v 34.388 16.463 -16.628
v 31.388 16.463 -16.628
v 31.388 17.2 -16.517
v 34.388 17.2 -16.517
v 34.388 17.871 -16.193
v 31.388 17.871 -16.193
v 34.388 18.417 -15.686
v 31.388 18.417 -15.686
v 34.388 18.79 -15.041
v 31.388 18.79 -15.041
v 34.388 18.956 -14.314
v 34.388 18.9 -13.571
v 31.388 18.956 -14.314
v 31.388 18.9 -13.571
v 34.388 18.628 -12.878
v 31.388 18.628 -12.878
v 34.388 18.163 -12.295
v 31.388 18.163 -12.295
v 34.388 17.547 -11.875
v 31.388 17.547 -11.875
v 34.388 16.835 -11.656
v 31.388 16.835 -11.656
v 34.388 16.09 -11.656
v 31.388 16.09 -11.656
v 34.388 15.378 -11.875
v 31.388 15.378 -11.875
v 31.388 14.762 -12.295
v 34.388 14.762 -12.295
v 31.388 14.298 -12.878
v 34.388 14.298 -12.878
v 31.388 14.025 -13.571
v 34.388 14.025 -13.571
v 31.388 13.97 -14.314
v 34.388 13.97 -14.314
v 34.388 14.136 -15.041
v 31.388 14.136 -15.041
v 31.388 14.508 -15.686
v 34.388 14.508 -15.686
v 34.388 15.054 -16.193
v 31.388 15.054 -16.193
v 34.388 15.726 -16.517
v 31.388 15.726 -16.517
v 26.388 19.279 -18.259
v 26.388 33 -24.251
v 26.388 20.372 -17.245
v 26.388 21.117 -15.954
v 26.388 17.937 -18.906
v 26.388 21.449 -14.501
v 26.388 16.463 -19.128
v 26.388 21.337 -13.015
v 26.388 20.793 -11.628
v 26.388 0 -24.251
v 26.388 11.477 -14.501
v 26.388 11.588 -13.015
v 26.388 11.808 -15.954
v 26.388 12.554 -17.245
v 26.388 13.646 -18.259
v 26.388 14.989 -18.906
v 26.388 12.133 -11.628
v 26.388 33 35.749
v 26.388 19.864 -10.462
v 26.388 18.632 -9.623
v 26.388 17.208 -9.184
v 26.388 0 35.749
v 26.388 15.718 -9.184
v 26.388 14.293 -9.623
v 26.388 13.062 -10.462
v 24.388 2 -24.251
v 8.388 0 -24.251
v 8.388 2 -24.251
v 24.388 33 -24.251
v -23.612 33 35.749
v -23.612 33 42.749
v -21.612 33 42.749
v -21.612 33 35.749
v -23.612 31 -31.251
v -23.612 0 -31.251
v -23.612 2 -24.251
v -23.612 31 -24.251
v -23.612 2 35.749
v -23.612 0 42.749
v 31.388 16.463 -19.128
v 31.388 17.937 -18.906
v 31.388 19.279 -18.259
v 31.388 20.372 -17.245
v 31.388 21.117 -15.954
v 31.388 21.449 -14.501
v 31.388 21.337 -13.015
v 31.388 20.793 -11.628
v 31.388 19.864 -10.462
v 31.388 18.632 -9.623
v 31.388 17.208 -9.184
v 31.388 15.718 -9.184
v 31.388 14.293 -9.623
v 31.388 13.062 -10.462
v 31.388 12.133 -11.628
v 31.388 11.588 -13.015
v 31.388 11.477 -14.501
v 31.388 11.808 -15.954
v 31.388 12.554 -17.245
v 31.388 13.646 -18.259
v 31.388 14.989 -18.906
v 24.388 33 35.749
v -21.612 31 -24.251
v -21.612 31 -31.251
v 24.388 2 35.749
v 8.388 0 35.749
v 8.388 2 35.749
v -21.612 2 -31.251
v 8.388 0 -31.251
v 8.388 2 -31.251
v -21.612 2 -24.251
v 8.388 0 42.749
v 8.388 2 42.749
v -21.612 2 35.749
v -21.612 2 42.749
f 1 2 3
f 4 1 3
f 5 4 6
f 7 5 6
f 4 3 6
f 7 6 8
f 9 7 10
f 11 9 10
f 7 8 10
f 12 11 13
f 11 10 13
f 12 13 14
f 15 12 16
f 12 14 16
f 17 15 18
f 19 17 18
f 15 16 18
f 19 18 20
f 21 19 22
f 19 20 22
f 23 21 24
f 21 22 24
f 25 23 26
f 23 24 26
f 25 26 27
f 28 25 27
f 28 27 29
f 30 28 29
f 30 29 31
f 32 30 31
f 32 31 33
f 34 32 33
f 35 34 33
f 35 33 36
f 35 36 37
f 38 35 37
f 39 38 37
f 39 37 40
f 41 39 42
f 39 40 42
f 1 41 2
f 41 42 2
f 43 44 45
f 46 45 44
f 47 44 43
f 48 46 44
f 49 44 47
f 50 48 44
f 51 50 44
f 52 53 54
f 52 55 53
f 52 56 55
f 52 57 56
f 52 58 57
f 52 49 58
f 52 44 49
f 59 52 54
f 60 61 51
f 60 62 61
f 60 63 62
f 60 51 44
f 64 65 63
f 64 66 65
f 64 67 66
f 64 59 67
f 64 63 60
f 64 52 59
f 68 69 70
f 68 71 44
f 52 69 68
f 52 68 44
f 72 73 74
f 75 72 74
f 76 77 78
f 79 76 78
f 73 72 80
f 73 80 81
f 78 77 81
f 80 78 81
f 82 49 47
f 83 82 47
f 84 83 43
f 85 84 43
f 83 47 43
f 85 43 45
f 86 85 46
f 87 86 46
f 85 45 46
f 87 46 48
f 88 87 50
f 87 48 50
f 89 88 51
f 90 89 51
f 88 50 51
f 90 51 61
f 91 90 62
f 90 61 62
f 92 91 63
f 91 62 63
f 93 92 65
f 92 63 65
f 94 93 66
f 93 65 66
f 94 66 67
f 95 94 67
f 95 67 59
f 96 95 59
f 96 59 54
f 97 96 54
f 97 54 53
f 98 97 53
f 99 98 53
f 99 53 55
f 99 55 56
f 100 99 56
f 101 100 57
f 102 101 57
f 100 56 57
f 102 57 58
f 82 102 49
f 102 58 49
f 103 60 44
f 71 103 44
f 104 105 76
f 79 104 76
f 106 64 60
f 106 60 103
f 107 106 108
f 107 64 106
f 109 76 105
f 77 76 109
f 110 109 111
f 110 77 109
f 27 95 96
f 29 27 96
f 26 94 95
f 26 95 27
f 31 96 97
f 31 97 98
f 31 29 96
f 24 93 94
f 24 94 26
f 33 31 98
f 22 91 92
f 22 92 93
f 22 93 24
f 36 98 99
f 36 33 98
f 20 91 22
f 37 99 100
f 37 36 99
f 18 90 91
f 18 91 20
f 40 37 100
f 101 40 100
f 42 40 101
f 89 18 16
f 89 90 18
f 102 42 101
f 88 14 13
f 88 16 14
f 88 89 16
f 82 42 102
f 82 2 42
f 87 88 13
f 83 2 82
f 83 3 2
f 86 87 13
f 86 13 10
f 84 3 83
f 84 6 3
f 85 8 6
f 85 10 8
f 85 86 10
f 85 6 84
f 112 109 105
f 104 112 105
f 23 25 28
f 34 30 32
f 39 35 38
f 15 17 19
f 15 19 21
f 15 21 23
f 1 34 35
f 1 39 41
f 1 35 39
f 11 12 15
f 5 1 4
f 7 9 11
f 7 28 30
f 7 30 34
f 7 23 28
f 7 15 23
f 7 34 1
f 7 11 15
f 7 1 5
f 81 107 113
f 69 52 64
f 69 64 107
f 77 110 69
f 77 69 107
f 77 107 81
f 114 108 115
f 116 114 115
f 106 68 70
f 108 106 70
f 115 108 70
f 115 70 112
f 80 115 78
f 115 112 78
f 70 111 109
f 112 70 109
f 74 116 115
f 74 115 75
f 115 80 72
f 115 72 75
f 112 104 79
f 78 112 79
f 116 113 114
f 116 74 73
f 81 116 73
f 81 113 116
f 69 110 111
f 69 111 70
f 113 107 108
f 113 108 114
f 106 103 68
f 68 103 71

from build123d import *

# Parameters (mm, degrees)
BOSS_EXTRU_1_DEPTH = 2
ESQUISSE4_W        = 2
ESQUISSE4_H        = 33
BOSS_EXTRU_2_DEPTH = 7
ESQUISSE6_W        = 60
ESQUISSE6_H        = 33
BOSS_EXTRU_3_DEPTH = 2
ESQUISSE7_W        = 2
ESQUISSE7_H        = 31
BOSS_EXTRU_4_DEPTH = 7
ESQUISSE8_R        = 5
BOSS_EXTRU_5_DEPTH = 5
ESQUISSE9_R        = 2.5
BOSS_EXTRU_6_DEPTH = 3


with BuildPart() as part:
    # Esquisse1 → Boss.-Extru.1 (new body)
    with BuildSketch(Plane(origin=(0, 0, 0), x_dir=(1, 0, 0), z_dir=(0, 1, 0))):
        Polygon((8.388206388, 24.250614251), (26.388206388, 24.250614251), (26.388206388, -35.749385749), (8.388206388, -35.749385749), (8.388206388, -42.749385749), (-23.611793612, -42.749385749), (-23.611793612, -35.749385749), (-23.611793612, 24.250614251), (-23.611793612, 31.250614251), (8.388206388, 31.250614251), align=None)
    extrude(amount=BOSS_EXTRU_1_DEPTH)

    # Esquisse4 → Boss.-Extru.2 (add)
    with BuildSketch(Plane.XY.offset(42.749385749)):
        with Locations((-22.611793612, 16.5)):
            Rectangle(ESQUISSE4_W, ESQUISSE4_H)
    extrude(amount=-BOSS_EXTRU_2_DEPTH)

    # Esquisse6 → Boss.-Extru.3 (add)
    with BuildSketch(Plane(origin=(26.388206388, 0, 0), x_dir=(0, 0, -1), z_dir=(1, 0, 0))):
        with Locations((-5.749385749, 16.5)):
            Rectangle(ESQUISSE6_W, ESQUISSE6_H)
    extrude(amount=-BOSS_EXTRU_3_DEPTH)

    # Esquisse7 → Boss.-Extru.4 (add)
    with BuildSketch(Plane(origin=(0, 0, -31.250614251), x_dir=(-1, 0, 0), z_dir=(0, 0, -1))):
        with Locations((22.611793612, 15.5)):
            Rectangle(ESQUISSE7_W, ESQUISSE7_H)
    extrude(amount=-BOSS_EXTRU_4_DEPTH)

    # Esquisse8 → Boss.-Extru.5 (add)
    with BuildSketch(Plane(origin=(26.388206388, 0, 0), x_dir=(0, 0, -1), z_dir=(1, 0, 0))):
        with Locations((14.127664827, 16.462750596)):
            Circle(ESQUISSE8_R)
    extrude(amount=BOSS_EXTRU_5_DEPTH)

    # Esquisse9 → Boss.-Extru.6 (add)
    with BuildSketch(Plane(origin=(31.388206388, 0, 0), x_dir=(0, 0, -1), z_dir=(1, 0, 0))):
        with Locations((14.127664827, 16.462750596)):
            Circle(ESQUISSE9_R)
    extrude(amount=BOSS_EXTRU_6_DEPTH)


solid = part.part
